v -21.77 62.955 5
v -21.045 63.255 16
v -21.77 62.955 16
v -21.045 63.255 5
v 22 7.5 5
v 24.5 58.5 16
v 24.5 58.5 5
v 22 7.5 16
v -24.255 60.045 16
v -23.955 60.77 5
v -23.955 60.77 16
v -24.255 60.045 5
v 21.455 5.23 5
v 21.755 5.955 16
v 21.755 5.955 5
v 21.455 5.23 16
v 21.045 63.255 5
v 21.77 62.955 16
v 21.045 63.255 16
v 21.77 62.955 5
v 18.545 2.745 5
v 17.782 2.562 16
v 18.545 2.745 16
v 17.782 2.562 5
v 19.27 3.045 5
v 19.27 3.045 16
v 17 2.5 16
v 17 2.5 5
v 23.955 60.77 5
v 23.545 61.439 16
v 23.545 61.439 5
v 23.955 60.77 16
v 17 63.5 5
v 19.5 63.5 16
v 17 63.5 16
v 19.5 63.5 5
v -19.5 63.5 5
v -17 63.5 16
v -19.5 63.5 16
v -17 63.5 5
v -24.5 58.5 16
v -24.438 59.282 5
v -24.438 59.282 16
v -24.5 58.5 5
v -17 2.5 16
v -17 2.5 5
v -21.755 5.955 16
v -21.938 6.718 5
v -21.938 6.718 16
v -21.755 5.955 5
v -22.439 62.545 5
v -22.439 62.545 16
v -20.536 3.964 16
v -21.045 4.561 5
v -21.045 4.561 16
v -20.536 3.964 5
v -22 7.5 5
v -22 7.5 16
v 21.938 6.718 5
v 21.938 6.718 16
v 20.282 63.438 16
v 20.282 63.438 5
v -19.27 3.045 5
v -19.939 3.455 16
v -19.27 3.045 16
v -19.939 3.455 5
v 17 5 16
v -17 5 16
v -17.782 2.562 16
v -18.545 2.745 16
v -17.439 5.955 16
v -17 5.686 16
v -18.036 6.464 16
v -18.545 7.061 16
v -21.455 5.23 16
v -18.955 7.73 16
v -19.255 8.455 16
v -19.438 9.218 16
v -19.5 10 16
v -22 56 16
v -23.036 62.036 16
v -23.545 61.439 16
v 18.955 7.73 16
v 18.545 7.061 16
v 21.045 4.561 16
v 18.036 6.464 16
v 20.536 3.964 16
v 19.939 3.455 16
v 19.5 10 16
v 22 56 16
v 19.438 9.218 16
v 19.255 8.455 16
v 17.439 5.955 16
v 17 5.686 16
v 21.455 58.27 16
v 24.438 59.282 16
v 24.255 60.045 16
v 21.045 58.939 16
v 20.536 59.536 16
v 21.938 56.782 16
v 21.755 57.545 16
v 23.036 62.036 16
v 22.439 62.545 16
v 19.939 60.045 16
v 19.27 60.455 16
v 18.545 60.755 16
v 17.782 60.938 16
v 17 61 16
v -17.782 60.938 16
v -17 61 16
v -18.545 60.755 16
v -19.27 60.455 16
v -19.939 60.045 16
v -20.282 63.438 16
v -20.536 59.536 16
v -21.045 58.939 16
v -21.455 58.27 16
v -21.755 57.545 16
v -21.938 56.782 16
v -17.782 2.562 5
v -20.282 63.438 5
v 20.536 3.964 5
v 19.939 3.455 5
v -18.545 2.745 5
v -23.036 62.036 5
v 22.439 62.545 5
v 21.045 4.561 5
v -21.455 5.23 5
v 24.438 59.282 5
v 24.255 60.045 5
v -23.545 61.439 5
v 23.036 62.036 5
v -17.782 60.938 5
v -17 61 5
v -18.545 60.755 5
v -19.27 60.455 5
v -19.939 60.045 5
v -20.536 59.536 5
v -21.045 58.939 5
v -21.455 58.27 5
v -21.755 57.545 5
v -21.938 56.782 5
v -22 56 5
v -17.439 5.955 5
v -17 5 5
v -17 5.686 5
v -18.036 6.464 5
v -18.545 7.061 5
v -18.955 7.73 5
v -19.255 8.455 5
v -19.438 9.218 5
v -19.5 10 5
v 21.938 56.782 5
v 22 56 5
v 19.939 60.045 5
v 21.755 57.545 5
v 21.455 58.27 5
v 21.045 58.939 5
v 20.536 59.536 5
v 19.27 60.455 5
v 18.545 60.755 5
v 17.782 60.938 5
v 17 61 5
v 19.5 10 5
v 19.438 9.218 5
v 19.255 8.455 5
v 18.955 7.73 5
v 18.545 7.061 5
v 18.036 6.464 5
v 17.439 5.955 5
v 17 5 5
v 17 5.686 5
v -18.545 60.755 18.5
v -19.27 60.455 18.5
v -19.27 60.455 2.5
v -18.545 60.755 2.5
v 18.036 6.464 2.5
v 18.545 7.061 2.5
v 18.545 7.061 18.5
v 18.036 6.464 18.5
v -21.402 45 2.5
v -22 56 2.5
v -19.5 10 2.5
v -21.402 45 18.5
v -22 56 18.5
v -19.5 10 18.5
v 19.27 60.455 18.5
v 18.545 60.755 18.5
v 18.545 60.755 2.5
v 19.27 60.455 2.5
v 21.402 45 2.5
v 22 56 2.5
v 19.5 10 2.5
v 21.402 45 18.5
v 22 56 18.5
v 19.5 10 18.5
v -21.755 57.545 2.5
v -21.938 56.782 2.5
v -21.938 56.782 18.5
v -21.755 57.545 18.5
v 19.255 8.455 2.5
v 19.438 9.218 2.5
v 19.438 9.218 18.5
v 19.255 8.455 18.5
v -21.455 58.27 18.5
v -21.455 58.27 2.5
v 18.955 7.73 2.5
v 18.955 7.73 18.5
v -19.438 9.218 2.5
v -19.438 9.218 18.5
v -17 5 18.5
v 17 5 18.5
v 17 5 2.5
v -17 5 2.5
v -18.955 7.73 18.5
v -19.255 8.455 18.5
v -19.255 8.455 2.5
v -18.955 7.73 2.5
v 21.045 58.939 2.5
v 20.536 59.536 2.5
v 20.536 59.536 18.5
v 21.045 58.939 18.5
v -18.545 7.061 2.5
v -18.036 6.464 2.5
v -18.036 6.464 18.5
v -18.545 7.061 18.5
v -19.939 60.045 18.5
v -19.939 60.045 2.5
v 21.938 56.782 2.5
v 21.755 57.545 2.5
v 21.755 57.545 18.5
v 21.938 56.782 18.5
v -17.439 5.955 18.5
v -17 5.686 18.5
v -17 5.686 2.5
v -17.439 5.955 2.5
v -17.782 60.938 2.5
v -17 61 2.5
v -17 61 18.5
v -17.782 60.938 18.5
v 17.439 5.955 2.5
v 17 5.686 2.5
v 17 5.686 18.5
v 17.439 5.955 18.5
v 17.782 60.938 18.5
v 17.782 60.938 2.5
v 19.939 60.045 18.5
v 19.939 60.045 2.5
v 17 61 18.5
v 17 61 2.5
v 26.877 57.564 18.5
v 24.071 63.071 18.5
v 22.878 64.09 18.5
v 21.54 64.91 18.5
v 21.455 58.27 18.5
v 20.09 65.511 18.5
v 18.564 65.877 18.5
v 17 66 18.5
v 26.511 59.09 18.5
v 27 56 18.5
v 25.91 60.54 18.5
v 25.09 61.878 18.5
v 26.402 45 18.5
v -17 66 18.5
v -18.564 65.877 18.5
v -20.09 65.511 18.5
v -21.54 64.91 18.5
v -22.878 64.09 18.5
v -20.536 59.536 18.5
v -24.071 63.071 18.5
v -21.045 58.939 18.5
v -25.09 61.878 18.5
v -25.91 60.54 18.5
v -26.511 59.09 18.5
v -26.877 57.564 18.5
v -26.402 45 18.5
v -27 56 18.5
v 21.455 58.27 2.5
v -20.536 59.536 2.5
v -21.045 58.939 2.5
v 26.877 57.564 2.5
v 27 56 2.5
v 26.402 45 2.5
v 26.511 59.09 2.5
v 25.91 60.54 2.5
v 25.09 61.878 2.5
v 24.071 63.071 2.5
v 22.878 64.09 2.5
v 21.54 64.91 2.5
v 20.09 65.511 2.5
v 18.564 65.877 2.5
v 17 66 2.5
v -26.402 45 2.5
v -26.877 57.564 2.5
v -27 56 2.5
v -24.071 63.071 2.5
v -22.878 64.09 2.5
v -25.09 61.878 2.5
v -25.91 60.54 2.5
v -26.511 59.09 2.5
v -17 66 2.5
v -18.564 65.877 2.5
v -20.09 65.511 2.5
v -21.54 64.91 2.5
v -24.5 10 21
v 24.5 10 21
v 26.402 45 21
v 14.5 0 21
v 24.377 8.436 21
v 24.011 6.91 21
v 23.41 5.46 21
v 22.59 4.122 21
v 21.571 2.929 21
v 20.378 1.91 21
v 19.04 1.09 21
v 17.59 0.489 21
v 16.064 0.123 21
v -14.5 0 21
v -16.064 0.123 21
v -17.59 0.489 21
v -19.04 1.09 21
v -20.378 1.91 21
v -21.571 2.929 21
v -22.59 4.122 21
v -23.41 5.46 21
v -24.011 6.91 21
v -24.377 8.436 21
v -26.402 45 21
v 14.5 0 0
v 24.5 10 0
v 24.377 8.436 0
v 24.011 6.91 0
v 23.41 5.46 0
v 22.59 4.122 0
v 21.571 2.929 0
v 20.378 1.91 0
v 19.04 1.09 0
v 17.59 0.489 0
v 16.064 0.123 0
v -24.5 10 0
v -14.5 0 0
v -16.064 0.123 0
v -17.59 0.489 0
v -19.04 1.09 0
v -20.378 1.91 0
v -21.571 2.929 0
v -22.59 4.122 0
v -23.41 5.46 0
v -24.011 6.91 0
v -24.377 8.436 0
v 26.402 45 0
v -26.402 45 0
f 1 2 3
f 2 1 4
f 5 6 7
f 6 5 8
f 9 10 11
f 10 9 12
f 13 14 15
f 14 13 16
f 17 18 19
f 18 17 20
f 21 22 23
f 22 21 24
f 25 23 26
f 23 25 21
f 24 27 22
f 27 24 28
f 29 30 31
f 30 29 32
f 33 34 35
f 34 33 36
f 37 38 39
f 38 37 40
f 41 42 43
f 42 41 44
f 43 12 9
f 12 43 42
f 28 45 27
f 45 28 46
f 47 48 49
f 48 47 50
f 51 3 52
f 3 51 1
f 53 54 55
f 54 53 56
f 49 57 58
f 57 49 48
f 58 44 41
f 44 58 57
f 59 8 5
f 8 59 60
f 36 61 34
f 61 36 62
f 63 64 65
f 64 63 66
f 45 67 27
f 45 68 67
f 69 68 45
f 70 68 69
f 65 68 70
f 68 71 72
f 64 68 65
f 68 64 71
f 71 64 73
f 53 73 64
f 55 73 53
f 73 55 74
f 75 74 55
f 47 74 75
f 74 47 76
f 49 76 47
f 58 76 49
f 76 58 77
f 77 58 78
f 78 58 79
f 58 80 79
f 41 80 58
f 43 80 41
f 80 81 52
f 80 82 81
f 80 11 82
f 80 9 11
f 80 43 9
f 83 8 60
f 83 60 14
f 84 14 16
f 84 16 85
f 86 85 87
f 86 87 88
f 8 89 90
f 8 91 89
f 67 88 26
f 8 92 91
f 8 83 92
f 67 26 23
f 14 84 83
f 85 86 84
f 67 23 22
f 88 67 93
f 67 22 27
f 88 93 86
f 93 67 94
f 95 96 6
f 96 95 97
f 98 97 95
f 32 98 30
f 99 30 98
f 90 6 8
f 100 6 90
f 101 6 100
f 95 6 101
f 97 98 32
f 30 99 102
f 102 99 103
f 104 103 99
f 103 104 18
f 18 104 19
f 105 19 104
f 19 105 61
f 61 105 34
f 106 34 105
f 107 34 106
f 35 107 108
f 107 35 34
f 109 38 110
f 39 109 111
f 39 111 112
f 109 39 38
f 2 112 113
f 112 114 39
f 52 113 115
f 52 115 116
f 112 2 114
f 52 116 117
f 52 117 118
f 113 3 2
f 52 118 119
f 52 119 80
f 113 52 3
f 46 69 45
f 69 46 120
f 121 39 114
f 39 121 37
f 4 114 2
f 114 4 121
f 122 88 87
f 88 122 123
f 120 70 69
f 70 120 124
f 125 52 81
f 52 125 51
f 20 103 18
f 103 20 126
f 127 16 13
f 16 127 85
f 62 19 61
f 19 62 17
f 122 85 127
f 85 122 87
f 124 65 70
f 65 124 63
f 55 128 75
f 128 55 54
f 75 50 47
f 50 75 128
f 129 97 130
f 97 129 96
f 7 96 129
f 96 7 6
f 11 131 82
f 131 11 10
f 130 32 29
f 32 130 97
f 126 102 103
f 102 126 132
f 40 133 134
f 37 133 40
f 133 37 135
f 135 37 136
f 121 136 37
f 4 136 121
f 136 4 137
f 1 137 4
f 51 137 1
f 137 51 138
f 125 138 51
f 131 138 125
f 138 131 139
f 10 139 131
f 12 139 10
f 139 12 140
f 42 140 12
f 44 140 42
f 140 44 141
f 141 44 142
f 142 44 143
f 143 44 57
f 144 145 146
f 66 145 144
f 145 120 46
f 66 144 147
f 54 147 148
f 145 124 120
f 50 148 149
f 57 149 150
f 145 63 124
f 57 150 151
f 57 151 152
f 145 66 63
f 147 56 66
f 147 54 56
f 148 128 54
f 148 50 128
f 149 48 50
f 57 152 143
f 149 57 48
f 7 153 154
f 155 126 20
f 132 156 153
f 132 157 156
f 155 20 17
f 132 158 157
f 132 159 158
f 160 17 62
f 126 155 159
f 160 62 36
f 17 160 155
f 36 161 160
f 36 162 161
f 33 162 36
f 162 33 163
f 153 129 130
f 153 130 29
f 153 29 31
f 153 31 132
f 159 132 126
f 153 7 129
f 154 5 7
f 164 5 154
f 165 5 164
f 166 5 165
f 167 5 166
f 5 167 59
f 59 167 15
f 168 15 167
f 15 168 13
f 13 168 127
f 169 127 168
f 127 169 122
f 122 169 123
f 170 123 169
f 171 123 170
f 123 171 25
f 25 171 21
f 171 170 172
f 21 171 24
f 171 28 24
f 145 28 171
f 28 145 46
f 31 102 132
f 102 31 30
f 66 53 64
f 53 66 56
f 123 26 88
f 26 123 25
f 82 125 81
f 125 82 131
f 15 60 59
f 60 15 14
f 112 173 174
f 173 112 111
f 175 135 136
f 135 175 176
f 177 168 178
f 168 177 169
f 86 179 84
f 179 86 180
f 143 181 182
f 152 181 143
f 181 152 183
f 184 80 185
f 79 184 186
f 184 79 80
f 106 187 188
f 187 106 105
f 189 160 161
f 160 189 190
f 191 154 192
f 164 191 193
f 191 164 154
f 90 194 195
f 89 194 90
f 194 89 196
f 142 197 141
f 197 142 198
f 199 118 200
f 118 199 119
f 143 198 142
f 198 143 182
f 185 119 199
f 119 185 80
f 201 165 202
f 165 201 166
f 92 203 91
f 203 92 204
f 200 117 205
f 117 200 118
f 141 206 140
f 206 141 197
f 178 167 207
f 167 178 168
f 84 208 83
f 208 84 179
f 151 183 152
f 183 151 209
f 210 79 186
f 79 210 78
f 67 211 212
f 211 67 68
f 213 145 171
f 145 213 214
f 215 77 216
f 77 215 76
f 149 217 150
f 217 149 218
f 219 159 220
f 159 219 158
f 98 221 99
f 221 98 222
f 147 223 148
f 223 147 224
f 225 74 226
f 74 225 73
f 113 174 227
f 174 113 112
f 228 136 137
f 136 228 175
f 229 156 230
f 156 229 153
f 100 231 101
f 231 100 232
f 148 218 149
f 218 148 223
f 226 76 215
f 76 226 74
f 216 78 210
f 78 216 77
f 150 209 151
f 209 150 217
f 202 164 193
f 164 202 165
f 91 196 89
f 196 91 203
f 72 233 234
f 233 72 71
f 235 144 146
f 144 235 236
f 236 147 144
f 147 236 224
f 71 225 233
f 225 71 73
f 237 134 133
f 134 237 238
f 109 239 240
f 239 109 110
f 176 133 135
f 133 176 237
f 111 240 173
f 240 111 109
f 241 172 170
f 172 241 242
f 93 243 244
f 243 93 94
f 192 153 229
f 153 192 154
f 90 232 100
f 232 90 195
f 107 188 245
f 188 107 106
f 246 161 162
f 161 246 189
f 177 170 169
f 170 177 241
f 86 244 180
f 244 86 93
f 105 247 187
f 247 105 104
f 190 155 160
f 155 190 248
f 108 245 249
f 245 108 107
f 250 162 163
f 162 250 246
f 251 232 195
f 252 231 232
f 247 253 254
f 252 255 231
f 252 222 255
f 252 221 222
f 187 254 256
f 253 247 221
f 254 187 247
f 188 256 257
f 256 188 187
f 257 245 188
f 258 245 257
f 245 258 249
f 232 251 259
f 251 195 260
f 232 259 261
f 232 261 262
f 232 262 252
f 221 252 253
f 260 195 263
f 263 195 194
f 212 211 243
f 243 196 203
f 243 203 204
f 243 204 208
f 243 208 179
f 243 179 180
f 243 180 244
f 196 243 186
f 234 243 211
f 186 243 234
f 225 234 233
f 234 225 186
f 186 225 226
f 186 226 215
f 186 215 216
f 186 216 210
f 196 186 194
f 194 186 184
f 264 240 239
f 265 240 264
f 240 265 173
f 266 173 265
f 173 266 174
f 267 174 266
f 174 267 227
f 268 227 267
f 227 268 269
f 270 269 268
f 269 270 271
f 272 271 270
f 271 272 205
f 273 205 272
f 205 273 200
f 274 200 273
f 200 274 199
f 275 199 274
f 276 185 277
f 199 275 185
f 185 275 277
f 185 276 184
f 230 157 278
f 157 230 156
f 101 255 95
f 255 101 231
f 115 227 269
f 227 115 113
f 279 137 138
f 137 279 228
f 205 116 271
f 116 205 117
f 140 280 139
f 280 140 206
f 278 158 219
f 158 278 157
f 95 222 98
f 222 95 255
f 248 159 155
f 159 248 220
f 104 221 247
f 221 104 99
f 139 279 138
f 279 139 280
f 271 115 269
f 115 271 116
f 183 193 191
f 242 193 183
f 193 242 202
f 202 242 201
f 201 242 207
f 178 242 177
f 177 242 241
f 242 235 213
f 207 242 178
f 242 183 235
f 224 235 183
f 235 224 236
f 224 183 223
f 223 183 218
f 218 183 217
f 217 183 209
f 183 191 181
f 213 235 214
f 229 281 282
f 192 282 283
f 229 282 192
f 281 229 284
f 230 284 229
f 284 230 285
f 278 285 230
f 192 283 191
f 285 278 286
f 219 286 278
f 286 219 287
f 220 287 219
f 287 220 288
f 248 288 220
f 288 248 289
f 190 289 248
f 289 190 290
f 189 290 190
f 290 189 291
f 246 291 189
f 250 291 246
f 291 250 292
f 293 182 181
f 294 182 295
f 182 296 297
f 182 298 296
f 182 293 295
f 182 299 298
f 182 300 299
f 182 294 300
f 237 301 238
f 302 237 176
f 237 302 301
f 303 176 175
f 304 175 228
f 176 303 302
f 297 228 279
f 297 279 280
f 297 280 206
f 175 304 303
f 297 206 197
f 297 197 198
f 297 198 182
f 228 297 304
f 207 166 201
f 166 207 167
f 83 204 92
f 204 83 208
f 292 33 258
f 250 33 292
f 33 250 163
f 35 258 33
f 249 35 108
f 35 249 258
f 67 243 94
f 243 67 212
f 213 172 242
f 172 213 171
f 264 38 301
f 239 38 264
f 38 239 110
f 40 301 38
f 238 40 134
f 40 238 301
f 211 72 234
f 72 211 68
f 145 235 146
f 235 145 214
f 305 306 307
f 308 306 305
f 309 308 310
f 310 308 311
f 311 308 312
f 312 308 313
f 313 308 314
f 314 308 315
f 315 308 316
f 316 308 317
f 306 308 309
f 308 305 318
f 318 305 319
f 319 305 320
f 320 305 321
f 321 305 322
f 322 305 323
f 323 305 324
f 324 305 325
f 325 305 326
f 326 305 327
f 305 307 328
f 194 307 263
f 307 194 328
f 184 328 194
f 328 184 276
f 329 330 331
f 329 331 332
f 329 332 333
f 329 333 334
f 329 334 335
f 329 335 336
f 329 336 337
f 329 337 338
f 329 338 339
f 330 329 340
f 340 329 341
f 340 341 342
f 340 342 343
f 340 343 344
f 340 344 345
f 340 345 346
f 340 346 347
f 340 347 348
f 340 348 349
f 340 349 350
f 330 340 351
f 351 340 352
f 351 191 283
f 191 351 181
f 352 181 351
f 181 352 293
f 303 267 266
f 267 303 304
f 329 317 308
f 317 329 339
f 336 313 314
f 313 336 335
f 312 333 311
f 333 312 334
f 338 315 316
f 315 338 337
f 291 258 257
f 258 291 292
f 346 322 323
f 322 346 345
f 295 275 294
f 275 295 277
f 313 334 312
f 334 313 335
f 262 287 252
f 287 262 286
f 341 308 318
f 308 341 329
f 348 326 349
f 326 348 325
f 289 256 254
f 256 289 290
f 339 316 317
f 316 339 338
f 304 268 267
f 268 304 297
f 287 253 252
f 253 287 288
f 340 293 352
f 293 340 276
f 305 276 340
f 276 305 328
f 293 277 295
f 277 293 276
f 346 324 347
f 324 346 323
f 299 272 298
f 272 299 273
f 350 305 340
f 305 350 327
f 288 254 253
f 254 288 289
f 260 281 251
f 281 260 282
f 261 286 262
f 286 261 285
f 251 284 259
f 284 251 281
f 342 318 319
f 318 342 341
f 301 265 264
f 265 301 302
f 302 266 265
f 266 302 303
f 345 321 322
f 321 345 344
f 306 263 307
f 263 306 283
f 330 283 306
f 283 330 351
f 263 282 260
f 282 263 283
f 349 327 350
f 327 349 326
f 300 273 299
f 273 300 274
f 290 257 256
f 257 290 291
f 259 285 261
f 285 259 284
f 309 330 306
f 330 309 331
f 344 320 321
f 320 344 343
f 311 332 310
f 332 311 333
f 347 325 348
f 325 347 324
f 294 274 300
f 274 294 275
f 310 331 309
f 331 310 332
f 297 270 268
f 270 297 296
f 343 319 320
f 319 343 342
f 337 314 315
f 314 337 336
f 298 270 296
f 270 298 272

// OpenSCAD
height = 61;
bottom_width = 44;
top_width = 49;
thickness = 11;

bottom_round = 5;
top_round = 10;

ring_offset = 14.3;

skin = 2.5;

cover_height = 45;

$fn=40;

difference() {
    fob(
        height = height + skin * 2, 
        bottom_width = bottom_width + skin * 2, 
        top_width = top_width + skin * 2,
        thickness = thickness + skin * 4,
        bottom_round = bottom_round + skin * 2,
        top_round = top_round + skin * 2
    );

    union() {
        translate([0, skin, skin * 2]) {
            fob(
                height = height, 
                bottom_width = bottom_width, 
                top_width = top_width,
                thickness = thickness,
                bottom_round = bottom_round,
                top_round = top_round
            );
        };
        translate([0, skin * 2, skin]) {
            fob(
                height = height - skin * 2,
                bottom_width = bottom_width - skin * 2,
                top_width = top_width - skin * 2,
                thickness = thickness + skin * 2,
                bottom_round = bottom_round,
                top_round = top_round
            );
        };
        translate([0 - bottom_width / 2 + skin * 2, skin * 2, skin]) {
            cube([
                bottom_width - skin * 4,
                height + skin * 2,
                thickness + skin * 2
            ]);
        };
        
        translate([
            0 - top_width / 2 - skin, 
            cover_height, 
            thickness + skin * 3
        ]) {
            cube([
                top_width + skin * 2,
                height + skin * 2 - cover_height, 
                skin
            ]); 
        };
        translate([
            0 - top_width / 2 - skin, 
            cover_height, 
            0
        ]) {
            cube([
                top_width + skin * 2,
                height + skin * 2 - cover_height, 
                skin
            ]); 
        };
    };
}


module fob() {
    linear_extrude(height = thickness) {
        minkowski() {
            polygon(points = [
                [0 - bottom_width / 2 + bottom_round, 0 + bottom_round], 
                [bottom_width / 2 - bottom_round, 0 + bottom_round], 
                [top_width / 2 - bottom_round, height - bottom_round], 
                [0 - top_width / 2 + bottom_round, height - bottom_round]
            ]);
            circle(bottom_round);
        };
    };
}
